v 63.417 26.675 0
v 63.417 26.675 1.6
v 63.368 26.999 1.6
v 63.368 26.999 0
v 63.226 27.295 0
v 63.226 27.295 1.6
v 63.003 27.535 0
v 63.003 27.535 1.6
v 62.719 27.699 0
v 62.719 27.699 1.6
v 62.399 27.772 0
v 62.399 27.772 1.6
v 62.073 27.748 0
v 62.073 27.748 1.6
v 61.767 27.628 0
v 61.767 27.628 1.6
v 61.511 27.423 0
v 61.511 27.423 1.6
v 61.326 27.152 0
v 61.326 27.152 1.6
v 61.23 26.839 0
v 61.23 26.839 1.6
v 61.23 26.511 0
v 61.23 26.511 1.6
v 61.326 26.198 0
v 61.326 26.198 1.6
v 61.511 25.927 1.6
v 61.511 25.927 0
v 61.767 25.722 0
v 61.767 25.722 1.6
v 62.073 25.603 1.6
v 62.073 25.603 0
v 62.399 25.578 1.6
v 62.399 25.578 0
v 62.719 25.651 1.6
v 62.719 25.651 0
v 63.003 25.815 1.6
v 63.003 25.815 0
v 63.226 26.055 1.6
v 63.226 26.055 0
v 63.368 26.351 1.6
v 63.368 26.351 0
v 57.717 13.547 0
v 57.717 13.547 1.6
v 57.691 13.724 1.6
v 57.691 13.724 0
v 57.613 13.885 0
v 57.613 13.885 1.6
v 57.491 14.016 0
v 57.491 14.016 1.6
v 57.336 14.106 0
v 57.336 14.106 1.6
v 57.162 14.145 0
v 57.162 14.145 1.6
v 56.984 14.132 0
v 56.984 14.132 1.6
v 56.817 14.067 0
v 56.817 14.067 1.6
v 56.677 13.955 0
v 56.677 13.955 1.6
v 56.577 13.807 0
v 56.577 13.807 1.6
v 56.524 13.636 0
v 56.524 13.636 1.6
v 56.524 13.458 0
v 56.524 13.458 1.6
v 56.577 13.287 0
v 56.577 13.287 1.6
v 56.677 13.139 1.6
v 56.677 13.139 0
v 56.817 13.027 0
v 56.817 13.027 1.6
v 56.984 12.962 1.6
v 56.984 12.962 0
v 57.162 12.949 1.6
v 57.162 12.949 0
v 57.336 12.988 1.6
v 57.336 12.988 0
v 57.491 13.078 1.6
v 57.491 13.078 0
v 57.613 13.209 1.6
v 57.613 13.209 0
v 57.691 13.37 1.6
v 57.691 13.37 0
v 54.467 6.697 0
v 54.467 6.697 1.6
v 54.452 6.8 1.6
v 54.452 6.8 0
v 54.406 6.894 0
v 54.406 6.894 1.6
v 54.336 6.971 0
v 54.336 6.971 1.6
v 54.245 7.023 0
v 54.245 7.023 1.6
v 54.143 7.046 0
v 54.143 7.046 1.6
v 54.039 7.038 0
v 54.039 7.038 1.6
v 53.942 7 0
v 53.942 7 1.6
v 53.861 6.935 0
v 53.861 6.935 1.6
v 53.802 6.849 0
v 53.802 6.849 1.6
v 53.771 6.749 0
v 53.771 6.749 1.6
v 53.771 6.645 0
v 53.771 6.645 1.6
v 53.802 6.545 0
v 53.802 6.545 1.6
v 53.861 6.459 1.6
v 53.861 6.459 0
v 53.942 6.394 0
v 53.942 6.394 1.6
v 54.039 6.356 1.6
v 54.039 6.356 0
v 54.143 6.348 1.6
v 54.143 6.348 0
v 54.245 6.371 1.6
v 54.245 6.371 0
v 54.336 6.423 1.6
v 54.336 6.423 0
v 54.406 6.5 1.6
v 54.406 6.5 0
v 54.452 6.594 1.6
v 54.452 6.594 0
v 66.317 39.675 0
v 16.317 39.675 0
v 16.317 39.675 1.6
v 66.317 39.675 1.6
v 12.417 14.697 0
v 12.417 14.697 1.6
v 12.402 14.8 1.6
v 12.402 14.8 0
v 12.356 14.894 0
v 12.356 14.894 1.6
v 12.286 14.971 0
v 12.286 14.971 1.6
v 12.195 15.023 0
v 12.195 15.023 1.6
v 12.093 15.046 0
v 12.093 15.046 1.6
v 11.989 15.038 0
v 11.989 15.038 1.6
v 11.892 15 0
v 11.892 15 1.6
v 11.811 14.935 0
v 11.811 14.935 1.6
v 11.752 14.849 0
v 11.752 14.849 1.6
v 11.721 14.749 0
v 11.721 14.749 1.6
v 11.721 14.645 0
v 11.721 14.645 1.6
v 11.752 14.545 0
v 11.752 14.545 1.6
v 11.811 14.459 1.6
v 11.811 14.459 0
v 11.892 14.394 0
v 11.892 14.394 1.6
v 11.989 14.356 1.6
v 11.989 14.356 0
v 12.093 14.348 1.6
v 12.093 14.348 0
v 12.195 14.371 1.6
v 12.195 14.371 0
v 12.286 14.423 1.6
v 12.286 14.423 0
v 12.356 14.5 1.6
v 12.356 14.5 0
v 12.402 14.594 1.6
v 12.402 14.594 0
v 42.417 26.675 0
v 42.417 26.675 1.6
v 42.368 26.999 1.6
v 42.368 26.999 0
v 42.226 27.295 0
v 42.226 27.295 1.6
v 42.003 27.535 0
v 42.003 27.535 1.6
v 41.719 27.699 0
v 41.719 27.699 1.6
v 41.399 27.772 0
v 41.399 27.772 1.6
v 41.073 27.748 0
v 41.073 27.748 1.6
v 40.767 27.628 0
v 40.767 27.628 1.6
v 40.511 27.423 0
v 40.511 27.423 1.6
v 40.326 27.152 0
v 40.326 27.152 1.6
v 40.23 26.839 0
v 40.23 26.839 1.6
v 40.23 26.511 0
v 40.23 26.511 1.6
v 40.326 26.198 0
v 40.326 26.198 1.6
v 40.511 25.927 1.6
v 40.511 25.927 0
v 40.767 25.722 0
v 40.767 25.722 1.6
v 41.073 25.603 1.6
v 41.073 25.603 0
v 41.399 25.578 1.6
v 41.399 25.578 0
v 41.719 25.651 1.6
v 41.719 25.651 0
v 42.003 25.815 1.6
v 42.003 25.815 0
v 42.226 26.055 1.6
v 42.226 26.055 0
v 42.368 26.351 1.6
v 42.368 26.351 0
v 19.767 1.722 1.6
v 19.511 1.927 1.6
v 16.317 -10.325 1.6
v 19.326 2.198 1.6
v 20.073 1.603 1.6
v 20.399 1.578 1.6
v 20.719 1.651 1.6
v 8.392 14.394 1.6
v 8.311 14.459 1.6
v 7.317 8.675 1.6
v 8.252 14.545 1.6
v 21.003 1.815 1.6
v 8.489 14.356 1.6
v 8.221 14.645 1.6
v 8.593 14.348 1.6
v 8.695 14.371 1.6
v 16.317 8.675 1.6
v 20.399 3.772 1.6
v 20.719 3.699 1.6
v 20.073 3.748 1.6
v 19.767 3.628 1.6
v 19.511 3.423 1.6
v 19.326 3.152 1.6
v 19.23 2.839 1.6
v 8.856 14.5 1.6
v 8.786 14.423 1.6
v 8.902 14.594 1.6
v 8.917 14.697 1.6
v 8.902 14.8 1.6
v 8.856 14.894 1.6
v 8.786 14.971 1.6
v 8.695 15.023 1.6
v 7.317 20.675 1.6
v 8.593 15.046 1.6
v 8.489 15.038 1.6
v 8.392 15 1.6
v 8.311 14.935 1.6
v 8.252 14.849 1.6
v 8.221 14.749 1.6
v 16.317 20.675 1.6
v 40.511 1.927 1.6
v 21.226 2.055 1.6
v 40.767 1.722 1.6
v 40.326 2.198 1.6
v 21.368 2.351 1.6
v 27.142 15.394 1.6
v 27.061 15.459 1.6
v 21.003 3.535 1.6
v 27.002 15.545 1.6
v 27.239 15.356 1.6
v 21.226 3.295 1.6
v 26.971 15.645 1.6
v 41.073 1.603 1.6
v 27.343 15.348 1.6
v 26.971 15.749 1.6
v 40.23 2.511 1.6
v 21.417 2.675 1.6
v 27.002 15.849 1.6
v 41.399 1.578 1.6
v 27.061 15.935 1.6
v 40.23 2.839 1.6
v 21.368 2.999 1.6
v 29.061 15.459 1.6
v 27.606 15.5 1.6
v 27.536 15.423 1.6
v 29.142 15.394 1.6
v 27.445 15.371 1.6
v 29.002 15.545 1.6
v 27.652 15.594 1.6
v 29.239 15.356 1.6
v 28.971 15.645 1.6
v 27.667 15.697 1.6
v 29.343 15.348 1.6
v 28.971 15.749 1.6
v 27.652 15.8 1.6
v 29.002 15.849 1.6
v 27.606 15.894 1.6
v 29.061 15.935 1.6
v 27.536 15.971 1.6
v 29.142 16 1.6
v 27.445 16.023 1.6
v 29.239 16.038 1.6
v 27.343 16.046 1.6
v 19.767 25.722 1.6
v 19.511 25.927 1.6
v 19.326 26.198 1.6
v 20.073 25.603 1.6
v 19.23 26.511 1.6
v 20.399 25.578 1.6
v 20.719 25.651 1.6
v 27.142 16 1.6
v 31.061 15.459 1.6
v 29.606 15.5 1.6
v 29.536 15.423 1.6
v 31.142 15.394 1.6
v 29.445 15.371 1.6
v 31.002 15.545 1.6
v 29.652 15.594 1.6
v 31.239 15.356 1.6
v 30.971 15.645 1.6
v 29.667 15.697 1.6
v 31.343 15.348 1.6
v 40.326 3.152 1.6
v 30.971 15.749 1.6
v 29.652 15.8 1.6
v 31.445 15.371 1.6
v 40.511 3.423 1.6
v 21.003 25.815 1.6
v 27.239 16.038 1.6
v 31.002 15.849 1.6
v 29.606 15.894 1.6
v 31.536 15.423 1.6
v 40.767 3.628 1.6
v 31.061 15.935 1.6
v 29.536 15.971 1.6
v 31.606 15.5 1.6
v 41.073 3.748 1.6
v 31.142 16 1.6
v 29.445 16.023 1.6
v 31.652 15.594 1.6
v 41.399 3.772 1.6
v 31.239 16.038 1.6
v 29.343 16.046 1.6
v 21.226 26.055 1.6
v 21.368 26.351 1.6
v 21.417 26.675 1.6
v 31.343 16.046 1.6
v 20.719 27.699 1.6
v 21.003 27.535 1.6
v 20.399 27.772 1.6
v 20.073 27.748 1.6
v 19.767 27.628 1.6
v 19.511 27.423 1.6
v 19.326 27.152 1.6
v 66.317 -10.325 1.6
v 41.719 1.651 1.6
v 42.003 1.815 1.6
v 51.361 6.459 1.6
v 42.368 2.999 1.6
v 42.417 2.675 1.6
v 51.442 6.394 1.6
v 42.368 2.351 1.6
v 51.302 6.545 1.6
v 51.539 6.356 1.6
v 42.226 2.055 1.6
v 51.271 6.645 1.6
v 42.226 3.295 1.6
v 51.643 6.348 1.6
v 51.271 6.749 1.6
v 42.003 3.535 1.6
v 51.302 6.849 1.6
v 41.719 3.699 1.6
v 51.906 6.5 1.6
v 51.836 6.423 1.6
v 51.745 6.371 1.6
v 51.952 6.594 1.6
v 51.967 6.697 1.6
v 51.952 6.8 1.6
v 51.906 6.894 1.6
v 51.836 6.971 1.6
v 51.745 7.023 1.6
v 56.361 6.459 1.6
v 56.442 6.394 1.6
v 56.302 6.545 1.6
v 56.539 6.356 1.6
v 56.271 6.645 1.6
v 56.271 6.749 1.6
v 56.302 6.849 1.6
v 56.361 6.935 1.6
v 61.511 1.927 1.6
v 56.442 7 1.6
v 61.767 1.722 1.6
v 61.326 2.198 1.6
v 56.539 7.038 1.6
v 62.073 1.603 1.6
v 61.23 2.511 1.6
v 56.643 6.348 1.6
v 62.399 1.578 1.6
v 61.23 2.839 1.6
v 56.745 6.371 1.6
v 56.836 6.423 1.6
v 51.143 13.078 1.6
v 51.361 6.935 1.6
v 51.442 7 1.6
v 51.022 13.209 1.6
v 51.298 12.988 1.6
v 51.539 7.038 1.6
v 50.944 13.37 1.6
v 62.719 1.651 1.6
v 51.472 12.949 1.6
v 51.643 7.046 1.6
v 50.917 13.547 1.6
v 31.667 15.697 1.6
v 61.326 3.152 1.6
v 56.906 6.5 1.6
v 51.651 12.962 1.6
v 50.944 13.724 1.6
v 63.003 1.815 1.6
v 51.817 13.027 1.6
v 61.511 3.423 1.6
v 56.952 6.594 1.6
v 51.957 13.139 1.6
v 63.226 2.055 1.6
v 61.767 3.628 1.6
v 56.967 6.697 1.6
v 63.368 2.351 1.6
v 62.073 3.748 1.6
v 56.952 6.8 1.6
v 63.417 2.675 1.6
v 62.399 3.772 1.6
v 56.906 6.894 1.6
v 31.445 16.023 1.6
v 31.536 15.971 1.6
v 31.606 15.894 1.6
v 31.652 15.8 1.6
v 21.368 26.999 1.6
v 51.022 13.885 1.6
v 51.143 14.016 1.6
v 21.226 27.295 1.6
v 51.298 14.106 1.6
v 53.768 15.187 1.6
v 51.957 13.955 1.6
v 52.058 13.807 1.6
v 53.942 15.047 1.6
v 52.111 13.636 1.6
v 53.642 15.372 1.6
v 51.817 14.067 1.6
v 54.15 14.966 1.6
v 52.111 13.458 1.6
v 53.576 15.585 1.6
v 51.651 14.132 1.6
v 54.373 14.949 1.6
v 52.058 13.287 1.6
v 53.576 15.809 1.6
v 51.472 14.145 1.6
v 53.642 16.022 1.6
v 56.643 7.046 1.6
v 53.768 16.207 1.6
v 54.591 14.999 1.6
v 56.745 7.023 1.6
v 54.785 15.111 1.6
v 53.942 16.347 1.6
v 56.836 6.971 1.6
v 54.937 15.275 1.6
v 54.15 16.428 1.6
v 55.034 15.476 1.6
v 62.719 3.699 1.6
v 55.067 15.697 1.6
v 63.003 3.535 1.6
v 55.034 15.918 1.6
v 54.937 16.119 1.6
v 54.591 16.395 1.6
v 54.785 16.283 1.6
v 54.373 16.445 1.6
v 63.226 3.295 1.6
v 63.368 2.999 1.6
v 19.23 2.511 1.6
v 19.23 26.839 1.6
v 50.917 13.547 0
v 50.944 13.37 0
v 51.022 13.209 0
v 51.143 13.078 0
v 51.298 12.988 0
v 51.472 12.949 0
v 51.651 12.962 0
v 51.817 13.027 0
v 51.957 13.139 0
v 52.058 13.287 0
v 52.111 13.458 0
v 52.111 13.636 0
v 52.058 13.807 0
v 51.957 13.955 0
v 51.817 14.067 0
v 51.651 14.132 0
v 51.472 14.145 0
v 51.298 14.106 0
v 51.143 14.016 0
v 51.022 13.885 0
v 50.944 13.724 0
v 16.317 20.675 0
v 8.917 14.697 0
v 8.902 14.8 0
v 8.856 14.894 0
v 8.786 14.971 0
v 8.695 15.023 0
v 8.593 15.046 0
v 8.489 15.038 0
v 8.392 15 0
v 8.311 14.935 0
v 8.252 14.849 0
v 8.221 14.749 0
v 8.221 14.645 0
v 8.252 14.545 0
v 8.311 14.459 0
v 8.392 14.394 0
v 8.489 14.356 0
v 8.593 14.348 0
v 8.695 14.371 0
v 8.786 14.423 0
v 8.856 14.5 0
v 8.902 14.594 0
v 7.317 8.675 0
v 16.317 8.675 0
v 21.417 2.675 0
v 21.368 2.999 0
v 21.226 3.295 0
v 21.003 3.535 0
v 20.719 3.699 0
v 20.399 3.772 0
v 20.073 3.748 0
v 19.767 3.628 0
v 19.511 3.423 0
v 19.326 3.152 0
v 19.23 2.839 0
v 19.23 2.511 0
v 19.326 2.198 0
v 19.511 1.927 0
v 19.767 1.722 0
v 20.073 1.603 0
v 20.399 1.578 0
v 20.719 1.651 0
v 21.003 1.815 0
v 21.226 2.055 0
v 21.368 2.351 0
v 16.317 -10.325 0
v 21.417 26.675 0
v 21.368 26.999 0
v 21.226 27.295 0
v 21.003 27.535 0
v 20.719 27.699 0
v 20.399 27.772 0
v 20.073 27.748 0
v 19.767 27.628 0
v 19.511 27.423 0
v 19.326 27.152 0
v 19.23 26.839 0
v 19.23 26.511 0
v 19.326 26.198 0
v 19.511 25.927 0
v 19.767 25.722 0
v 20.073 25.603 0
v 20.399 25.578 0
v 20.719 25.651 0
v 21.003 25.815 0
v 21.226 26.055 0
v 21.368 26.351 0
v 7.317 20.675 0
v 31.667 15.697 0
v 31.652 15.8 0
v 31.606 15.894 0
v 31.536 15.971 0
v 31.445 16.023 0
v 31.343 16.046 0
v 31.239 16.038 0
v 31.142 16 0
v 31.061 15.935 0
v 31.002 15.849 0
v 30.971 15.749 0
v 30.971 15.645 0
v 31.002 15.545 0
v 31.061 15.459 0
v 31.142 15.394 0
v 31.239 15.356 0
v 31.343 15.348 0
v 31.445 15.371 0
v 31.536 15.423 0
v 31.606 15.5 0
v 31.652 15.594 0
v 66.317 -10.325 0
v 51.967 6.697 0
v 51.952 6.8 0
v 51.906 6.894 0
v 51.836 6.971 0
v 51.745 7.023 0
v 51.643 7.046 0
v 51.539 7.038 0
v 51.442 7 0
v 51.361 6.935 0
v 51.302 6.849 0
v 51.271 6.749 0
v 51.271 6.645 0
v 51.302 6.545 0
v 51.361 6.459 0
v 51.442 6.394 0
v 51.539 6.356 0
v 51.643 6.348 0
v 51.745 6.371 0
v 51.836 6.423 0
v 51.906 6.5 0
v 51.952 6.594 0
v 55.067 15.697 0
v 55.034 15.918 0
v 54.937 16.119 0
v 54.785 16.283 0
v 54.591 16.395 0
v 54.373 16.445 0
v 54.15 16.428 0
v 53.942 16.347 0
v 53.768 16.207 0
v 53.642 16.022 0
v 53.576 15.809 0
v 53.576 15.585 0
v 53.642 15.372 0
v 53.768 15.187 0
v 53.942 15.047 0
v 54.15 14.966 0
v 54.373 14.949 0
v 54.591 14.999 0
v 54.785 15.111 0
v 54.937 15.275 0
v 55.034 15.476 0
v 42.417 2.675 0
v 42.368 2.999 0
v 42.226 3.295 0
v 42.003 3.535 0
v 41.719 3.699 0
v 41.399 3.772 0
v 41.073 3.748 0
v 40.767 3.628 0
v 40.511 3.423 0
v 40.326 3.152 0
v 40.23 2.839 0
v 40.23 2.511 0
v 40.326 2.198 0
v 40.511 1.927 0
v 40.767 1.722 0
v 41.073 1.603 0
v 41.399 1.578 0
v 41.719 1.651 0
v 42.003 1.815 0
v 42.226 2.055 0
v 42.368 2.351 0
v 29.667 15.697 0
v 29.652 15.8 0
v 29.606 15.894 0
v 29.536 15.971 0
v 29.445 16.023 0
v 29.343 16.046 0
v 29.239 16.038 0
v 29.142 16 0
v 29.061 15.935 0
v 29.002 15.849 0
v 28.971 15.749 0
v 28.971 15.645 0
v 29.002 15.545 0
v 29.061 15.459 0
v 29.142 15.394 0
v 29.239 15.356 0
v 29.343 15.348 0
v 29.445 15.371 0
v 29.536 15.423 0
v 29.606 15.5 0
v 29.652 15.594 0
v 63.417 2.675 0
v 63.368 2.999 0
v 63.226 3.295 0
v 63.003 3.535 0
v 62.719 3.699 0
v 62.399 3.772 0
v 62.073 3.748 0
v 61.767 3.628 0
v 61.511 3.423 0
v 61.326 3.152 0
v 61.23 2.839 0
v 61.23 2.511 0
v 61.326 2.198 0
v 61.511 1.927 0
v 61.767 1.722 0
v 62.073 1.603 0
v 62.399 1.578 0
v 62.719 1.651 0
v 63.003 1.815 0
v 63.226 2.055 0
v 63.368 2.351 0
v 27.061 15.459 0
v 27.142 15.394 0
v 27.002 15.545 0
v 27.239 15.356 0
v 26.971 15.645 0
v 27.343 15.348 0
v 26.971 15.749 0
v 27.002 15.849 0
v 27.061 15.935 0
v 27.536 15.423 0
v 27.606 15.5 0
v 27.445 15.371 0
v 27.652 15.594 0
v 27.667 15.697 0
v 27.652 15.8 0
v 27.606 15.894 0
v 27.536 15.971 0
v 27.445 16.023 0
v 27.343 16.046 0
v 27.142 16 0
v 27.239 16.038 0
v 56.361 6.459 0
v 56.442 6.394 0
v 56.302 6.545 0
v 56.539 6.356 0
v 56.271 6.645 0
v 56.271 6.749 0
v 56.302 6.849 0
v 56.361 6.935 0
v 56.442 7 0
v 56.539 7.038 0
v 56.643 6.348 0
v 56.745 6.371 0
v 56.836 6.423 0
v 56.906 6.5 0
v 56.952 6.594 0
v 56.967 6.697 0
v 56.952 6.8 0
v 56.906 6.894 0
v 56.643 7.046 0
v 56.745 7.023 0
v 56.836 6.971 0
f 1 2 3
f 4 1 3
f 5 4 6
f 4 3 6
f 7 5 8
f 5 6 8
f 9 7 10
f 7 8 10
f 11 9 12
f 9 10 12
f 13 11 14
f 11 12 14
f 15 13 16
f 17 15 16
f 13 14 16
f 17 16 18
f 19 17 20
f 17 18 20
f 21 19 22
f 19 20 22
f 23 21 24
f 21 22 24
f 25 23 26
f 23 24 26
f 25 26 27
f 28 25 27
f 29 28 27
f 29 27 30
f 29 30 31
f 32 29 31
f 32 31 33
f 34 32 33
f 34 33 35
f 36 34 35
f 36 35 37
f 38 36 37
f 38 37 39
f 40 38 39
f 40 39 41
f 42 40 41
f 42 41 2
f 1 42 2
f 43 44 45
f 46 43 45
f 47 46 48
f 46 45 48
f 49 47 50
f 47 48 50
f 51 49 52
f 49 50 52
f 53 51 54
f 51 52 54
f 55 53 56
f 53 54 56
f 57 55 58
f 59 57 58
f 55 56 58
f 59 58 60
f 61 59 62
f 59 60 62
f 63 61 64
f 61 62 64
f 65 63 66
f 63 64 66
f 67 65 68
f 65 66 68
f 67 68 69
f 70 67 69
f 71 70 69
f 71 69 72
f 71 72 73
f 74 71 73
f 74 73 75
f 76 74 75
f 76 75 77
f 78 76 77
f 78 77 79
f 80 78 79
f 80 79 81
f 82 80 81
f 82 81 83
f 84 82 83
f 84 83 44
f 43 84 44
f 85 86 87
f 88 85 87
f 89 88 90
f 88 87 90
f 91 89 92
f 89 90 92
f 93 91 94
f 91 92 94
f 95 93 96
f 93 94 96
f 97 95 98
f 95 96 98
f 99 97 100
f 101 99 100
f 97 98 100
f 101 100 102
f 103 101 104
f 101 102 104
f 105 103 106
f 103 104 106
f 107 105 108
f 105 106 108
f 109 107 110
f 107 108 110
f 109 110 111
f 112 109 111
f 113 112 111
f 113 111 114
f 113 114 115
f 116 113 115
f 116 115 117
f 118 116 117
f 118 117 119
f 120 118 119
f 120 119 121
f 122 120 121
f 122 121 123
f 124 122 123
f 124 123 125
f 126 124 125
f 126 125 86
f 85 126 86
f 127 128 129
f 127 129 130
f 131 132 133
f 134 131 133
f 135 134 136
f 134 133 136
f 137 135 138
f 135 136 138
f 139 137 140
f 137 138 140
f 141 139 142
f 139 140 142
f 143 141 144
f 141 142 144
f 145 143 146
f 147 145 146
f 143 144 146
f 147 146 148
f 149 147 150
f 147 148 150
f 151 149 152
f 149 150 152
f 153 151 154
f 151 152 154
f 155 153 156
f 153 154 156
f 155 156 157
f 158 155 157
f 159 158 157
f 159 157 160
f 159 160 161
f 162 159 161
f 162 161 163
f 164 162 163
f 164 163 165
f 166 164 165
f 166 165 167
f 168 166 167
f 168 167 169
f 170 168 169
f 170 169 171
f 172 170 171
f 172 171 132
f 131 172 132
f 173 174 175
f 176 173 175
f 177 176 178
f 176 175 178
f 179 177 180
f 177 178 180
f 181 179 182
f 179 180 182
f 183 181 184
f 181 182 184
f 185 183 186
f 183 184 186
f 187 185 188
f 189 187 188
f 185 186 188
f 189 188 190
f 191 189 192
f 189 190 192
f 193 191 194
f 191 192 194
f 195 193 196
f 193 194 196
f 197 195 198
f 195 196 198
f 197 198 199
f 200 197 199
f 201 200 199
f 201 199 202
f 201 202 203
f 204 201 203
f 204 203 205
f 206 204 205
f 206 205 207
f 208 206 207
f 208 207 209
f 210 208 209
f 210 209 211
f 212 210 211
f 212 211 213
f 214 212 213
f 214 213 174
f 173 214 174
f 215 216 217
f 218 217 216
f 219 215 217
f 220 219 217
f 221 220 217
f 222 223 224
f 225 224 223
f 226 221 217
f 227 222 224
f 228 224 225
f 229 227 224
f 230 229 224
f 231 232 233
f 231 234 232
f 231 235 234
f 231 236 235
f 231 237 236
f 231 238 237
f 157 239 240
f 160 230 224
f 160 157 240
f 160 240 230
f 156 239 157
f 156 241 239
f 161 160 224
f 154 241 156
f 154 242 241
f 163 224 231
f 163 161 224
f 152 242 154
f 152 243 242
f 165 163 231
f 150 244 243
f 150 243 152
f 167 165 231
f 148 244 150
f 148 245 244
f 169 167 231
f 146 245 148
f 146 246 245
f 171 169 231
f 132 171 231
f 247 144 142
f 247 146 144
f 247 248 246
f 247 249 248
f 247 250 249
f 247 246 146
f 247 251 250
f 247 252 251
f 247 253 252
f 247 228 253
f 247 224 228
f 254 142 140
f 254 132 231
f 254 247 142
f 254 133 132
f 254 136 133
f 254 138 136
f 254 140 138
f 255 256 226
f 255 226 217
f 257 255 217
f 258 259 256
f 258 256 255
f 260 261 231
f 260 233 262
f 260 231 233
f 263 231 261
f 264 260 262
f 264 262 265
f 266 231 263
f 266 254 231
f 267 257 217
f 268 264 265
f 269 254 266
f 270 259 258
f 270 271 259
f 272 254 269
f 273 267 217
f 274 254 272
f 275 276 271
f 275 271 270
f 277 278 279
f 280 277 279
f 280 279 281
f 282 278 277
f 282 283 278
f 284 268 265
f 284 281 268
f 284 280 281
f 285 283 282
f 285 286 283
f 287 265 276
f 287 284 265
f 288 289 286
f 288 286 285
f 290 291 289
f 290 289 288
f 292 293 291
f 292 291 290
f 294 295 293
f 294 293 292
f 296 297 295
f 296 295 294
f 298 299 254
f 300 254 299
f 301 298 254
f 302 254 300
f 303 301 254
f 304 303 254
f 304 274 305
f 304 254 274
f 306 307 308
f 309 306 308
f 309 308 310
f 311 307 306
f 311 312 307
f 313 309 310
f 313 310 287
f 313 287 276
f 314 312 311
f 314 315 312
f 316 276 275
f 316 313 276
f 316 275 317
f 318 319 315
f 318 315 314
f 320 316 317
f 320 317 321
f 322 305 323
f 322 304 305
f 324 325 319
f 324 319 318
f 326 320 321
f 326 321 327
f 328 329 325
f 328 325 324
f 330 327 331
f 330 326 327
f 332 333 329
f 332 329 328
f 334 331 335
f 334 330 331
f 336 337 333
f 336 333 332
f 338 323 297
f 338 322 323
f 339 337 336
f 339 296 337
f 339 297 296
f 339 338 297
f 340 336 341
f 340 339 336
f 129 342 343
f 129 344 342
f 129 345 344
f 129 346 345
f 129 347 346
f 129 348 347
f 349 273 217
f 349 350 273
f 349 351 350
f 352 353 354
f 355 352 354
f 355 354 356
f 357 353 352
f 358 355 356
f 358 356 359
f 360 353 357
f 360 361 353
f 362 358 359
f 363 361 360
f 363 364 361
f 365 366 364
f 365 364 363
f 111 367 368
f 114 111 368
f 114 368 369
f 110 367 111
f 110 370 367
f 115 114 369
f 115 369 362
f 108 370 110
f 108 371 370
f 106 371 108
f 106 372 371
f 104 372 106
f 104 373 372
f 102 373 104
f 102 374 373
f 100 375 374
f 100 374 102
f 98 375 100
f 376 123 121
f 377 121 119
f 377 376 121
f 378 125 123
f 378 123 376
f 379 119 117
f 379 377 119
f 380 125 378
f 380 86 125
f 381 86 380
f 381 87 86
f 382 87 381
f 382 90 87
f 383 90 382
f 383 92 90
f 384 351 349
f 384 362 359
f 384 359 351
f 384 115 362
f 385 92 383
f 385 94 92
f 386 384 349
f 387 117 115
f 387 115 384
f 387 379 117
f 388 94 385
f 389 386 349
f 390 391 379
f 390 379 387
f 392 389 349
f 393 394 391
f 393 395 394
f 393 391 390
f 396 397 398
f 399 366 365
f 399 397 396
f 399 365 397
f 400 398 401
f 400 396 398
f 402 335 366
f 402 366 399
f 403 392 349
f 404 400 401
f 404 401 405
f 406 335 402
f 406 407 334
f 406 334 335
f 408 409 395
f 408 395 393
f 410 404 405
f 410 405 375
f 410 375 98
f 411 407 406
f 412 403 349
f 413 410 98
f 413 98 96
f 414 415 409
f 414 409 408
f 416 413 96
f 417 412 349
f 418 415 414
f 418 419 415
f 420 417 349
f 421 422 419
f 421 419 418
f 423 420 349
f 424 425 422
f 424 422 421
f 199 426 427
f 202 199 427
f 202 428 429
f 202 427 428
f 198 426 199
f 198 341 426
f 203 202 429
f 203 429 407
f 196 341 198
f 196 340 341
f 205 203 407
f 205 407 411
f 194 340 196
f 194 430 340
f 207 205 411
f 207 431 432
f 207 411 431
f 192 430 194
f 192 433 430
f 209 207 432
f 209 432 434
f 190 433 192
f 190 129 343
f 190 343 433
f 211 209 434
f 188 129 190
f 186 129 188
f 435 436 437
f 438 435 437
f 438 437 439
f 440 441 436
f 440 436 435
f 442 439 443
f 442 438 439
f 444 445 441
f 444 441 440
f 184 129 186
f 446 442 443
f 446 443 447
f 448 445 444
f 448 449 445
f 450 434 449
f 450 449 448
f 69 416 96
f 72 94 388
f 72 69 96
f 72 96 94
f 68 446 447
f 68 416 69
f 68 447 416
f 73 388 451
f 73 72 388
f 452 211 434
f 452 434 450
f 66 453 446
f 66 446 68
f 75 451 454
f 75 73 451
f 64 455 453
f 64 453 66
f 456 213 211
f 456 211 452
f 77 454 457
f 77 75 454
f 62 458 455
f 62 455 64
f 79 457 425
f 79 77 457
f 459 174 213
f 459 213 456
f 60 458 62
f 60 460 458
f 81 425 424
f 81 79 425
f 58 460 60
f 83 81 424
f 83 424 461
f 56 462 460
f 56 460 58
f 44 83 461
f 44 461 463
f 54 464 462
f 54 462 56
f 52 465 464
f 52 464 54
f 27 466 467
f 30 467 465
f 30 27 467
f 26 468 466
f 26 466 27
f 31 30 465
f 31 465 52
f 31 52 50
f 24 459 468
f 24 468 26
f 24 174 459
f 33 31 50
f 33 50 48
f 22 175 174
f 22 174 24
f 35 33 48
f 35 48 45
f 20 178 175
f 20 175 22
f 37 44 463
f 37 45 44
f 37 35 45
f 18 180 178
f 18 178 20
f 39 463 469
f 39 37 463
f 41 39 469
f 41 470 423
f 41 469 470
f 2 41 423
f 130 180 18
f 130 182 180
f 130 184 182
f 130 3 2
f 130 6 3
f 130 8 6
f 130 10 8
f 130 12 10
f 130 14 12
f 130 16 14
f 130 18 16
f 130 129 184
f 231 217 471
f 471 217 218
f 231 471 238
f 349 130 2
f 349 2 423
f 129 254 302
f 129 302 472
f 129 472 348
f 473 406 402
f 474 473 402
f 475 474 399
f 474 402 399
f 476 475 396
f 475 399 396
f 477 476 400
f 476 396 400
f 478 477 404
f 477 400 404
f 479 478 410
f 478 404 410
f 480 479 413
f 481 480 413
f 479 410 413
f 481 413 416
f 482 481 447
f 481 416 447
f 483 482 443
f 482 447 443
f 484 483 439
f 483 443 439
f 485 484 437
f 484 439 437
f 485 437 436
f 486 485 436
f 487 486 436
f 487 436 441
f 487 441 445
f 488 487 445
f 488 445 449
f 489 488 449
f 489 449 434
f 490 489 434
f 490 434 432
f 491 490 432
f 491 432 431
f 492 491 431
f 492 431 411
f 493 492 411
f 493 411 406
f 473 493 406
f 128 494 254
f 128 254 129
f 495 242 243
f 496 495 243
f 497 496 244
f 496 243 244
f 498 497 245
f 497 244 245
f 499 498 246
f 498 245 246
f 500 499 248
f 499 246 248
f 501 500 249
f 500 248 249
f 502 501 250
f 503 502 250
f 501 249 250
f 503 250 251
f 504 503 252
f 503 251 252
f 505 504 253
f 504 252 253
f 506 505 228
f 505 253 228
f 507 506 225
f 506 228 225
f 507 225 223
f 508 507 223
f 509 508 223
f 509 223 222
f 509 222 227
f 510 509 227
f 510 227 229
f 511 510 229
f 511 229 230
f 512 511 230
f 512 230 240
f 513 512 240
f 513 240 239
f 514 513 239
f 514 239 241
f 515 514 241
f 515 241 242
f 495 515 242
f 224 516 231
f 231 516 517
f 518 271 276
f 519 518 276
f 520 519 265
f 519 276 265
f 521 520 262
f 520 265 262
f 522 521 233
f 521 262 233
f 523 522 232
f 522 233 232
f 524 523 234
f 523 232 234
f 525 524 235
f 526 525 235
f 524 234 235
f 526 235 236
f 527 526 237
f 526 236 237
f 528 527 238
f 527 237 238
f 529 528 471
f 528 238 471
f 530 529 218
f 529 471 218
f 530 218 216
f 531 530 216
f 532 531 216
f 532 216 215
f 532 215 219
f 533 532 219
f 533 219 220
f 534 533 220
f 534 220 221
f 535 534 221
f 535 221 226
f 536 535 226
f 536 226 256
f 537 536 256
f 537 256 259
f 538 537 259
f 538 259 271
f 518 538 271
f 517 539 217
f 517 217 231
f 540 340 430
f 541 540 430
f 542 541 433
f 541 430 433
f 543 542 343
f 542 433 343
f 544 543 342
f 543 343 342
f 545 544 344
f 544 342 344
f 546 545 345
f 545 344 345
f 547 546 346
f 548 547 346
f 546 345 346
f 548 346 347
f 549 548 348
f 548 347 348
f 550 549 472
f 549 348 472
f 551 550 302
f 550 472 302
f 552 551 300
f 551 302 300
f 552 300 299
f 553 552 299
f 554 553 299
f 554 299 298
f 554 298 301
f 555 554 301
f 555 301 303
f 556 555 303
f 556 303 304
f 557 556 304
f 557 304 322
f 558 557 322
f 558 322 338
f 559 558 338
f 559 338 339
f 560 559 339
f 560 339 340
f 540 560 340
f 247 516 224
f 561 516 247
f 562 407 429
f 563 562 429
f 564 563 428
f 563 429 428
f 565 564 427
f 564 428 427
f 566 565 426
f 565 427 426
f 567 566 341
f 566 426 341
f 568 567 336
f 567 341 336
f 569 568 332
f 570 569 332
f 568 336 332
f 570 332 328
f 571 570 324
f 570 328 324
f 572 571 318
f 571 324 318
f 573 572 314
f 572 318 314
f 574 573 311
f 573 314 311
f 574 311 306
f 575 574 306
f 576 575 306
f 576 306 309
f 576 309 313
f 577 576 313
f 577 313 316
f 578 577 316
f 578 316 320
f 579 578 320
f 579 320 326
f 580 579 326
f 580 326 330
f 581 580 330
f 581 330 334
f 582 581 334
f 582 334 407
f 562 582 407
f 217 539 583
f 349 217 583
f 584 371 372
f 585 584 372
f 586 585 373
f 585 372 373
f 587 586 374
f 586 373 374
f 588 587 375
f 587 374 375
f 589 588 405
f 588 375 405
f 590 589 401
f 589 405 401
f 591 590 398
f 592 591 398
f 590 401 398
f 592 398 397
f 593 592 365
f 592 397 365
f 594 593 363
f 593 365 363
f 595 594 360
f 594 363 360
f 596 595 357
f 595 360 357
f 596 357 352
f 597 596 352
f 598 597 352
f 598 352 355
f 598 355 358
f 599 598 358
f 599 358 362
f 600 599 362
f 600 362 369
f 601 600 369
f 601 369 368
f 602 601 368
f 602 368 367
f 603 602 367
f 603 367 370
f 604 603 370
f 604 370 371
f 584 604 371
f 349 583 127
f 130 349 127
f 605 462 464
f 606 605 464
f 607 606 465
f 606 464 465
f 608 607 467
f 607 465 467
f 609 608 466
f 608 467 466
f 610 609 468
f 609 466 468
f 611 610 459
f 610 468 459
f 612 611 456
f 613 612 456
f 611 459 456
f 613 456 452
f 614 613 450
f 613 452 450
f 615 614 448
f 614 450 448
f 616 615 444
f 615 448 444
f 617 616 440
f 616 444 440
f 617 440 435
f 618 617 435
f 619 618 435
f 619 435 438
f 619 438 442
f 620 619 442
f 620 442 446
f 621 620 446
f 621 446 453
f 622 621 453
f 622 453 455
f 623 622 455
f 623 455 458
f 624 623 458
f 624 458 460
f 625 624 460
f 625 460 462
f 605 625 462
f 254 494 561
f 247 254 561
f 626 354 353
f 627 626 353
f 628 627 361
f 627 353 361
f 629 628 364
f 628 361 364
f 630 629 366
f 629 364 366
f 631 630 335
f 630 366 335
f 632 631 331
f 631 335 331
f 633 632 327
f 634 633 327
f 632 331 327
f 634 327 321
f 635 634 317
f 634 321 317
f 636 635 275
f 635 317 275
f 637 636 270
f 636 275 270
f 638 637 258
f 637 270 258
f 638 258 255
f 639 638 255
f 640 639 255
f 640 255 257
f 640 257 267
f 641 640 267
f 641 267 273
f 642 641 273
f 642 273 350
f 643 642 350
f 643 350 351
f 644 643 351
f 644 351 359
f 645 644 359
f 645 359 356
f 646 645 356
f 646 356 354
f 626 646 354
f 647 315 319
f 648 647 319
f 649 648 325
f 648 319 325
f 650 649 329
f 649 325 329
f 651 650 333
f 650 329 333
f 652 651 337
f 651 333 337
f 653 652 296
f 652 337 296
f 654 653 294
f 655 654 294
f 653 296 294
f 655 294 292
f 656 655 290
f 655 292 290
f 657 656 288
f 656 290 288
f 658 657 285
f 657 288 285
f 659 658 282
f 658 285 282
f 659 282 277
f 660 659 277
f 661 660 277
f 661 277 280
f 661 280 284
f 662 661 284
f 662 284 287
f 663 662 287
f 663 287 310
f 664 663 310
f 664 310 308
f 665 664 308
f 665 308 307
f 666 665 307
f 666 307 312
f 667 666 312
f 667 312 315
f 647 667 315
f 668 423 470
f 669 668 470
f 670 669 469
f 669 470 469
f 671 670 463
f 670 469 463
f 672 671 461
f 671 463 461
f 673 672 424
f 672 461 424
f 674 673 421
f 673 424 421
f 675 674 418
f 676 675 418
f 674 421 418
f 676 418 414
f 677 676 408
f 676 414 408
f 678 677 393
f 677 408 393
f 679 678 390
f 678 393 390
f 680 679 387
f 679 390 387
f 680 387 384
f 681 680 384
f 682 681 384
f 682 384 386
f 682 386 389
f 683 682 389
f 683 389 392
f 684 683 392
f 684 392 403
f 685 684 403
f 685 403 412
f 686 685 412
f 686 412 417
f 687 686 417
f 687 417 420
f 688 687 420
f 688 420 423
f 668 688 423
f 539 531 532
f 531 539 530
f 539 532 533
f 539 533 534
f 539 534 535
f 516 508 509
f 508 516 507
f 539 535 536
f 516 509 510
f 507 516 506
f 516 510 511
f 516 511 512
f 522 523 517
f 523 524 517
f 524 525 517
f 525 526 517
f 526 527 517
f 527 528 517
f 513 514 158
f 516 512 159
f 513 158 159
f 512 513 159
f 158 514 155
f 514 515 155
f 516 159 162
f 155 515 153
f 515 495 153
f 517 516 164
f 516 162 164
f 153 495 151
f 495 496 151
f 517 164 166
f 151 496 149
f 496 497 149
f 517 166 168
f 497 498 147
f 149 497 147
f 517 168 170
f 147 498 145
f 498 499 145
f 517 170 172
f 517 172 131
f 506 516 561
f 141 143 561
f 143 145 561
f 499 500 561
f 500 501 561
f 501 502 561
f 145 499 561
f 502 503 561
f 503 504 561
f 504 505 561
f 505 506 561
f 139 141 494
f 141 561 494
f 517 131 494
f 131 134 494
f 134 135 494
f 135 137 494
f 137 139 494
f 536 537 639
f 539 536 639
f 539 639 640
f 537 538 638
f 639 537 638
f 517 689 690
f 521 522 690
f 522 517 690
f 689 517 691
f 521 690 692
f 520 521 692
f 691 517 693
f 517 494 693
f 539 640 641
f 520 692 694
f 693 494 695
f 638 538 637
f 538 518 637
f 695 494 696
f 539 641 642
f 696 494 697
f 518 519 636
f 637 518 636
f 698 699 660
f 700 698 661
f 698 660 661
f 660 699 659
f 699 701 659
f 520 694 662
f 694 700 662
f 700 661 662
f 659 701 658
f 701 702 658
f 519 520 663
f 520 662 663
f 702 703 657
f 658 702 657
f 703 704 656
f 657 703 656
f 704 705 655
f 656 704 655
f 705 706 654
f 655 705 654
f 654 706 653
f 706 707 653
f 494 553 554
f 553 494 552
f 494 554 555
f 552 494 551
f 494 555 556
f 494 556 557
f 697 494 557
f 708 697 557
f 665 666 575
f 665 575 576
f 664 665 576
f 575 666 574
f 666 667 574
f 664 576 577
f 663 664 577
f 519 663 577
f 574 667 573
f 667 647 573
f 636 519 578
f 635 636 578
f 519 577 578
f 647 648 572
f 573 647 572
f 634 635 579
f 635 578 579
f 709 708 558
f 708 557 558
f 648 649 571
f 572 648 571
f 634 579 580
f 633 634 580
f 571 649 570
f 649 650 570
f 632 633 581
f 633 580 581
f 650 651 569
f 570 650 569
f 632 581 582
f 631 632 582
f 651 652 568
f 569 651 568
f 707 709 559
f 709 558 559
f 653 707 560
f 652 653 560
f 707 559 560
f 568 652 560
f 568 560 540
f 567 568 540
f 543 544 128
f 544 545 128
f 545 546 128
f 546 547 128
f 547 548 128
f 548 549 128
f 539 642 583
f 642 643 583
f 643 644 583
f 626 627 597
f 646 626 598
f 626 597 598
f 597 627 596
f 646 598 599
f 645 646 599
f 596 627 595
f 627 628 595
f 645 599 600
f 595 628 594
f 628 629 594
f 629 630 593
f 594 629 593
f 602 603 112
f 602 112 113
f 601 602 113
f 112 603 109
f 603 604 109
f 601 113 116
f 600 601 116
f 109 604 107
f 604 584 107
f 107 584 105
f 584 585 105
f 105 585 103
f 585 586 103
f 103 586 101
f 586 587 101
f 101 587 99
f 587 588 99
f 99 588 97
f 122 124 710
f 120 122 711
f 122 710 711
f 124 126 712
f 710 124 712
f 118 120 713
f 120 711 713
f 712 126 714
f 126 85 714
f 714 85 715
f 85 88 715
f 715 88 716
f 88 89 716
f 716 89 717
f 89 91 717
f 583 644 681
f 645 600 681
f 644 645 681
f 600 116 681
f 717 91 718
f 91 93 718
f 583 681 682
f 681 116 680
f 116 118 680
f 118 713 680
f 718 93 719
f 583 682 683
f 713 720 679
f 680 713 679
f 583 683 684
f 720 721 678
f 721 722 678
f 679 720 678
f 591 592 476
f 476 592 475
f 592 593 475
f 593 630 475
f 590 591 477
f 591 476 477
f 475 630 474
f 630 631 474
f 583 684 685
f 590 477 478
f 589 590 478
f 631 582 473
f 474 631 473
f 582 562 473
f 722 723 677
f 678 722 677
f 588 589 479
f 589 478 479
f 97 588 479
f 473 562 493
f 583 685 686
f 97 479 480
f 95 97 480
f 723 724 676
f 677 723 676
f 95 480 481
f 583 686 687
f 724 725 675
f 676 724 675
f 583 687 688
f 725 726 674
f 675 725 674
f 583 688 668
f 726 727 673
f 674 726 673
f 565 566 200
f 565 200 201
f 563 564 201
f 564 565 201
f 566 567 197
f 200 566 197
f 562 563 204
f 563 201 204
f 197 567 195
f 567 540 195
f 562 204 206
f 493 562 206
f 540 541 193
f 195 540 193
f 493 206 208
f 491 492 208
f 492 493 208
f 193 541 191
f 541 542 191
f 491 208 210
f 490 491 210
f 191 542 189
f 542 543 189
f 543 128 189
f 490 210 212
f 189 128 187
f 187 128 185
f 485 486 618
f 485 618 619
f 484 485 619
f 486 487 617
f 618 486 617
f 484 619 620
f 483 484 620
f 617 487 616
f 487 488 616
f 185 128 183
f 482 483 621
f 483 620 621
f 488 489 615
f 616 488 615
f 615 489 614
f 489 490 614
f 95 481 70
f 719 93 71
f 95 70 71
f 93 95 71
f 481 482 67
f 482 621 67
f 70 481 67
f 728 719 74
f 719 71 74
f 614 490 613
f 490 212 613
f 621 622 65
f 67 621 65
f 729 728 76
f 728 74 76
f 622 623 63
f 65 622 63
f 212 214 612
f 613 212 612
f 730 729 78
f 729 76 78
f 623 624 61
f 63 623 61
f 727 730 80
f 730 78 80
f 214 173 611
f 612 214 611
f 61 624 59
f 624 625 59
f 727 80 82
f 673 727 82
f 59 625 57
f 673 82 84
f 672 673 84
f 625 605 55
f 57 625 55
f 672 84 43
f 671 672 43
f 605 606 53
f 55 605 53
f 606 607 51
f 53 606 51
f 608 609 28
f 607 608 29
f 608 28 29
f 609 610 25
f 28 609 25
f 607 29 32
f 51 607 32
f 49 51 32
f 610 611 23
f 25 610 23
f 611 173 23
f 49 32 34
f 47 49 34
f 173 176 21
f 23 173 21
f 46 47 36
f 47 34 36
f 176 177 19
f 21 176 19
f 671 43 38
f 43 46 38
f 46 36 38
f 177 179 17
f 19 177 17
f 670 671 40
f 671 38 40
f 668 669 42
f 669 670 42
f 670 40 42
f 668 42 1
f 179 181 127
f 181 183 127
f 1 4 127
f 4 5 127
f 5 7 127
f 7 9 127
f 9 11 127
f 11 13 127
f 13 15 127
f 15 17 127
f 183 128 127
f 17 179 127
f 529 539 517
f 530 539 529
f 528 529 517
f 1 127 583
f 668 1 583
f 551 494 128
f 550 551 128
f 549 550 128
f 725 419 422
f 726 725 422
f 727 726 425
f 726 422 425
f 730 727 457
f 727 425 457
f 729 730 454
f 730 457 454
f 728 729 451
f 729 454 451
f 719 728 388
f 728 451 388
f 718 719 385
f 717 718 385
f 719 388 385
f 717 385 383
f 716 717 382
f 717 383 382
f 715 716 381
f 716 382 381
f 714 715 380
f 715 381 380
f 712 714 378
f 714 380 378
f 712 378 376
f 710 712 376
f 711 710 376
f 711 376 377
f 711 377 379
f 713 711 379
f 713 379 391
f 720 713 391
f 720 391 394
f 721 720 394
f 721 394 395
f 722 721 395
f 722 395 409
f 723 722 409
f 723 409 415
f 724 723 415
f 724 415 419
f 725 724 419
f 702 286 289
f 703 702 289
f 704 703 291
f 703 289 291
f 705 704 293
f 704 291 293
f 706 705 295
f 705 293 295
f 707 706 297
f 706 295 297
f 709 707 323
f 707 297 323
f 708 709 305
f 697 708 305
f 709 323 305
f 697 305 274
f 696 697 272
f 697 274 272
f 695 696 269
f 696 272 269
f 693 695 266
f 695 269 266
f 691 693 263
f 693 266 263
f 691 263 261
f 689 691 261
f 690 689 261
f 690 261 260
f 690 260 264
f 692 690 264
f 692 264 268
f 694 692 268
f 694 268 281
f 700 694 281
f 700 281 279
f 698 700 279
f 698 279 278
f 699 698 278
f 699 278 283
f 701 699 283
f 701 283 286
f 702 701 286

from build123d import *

# Parameters (mm, degrees)
F0_W     = 9
F0_H     = 12
F0_W_2   = 50
F0_H_2   = 19
F1_DEPTH = 1.6
F4_R     = 0.35
F5_R     = 0.35
F2_R     = 0.35
F6_DEPTH = 4
F7_R     = 1.1
F8_DEPTH = 25


# Not quite as in the source:
# - a feature names something its author has since deleted; it is built from what else it names


with BuildPart() as f1:
    # F0 (on Top) → F1 (new body)
    with BuildSketch(Plane.XY):
        with Locations((11.8172904253, 14.6750973295)):
            Rectangle(F0_W, F0_H)
        with Locations((41.3172904253, 14.6750973295)):
            Rectangle(F0_W_2, F0_H)
        with Locations((41.3172904253, -0.8249026705)):
            Rectangle(F0_W_2, F0_H_2)
        with Locations((41.3172904253, 30.1750973295)):
            Rectangle(F0_W_2, F0_H_2)
    extrude(amount=F1_DEPTH)

    # F4 (on face) + F5 (on face) + F3 (on face) + F2 (on face) → F6 (cut)
    with BuildSketch(Plane.XY.offset(1.6)):
        with Locations((51.6172904253, 6.6970097786)):
            Circle(F4_R)
        with Locations((56.6172904253, 6.6970097786)):
            Circle(F4_R)
        with Locations((54.1172904253, 6.6970097786)):
            Circle(F4_R)
    with BuildSketch(Plane.XY.offset(1.6)):
        with Locations((8.5672904253, 14.6970097786)):
            Circle(F5_R)
        with Locations((12.0672904253, 14.6970097786)):
            Circle(F5_R)
    with BuildSketch(Plane.XY.offset(1.6)):
        with BuildLine():
            Line((54.8172904253, 15.4470097786), (53.8172904253, 15.4470097786))
            ThreePointArc((53.8172904253, 15.4470097786), (53.640513733, 15.5202330803), (53.5672904253, 15.6970097701))
            ThreePointArc((53.5672904253, 15.6970097701), (54.3172904296, 14.9470097786), (55.0672904253, 15.6970097786))
            ThreePointArc((55.0672904253, 15.6970097786), (54.9940671206, 15.5202330833), (54.8172904253, 15.4470097786))
        make_face()
        with BuildLine():
            ThreePointArc((53.5672904253, 15.6970097701), (53.640513733, 15.5202330803), (53.8172904253, 15.4470097786))
            Line((53.8172904253, 15.4470097786), (54.8172904253, 15.4470097786))
            ThreePointArc((54.8172904253, 15.4470097786), (54.9940671206, 15.5202330833), (55.0672904253, 15.6970097786))
            ThreePointArc((55.0672904253, 15.6970097786), (54.9940671206, 15.8737864739), (54.8172904253, 15.9470097786))
            Line((54.8172904253, 15.9470097786), (53.8172904253, 15.9470097786))
            ThreePointArc((53.8172904253, 15.9470097786), (53.640513727, 15.8737864709), (53.5672904253, 15.6970097701))
        make_face()
        with BuildLine():
            ThreePointArc((55.0672904253, 15.6970097786), (54.317290421, 16.4470097786), (53.5672904253, 15.6970097701))
            ThreePointArc((53.5672904253, 15.6970097701), (53.640513727, 15.8737864709), (53.8172904253, 15.9470097786))
            Line((53.8172904253, 15.9470097786), (54.8172904253, 15.9470097786))
            ThreePointArc((54.8172904253, 15.9470097786), (54.9940671206, 15.8737864739), (55.0672904253, 15.6970097786))
        make_face()
        with BuildLine():
            Line((51.1672904253, 13.7970097786), (51.8672904253, 13.7970097786))
            ThreePointArc((51.8672904253, 13.7970097786), (52.0440671206, 13.7237864739), (52.1172904253, 13.5470097786))
            ThreePointArc((52.1172904253, 13.5470097786), (51.5172904253, 14.1470097786), (50.9172904253, 13.5470097786))
            ThreePointArc((50.9172904253, 13.5470097786), (50.99051373, 13.7237864739), (51.1672904253, 13.7970097786))
        make_face()
        with BuildLine():
            ThreePointArc((52.1172904253, 13.5470097786), (52.0440671206, 13.7237864739), (51.8672904253, 13.7970097786))
            Line((51.8672904253, 13.7970097786), (51.1672904253, 13.7970097786))
            ThreePointArc((51.1672904253, 13.7970097786), (50.99051373, 13.7237864739), (50.9172904253, 13.5470097786))
            ThreePointArc((50.9172904253, 13.5470097786), (50.99051373, 13.3702330833), (51.1672904253, 13.2970097786))
            Line((51.1672904253, 13.2970097786), (51.8672904253, 13.2970097786))
            ThreePointArc((51.8672904253, 13.2970097786), (52.0440671206, 13.3702330833), (52.1172904253, 13.5470097786))
        make_face()
        with BuildLine():
            ThreePointArc((50.9172904253, 13.5470097786), (51.5172904253, 12.9470097786), (52.1172904253, 13.5470097786))
            ThreePointArc((52.1172904253, 13.5470097786), (52.0440671206, 13.3702330833), (51.8672904253, 13.2970097786))
            Line((51.8672904253, 13.2970097786), (51.1672904253, 13.2970097786))
            ThreePointArc((51.1672904253, 13.2970097786), (50.99051373, 13.3702330833), (50.9172904253, 13.5470097786))
        make_face()
        with BuildLine():
            Line((56.7672904253, 13.2970097786), (57.4672904253, 13.2970097786))
            ThreePointArc((57.4672904253, 13.2970097786), (57.6440671206, 13.3702330833), (57.7172904253, 13.5470097786))
            ThreePointArc((57.7172904253, 13.5470097786), (57.6440671206, 13.7237864739), (57.4672904253, 13.7970097786))
            Line((57.4672904253, 13.7970097786), (56.7672904253, 13.7970097786))
            ThreePointArc((56.7672904253, 13.7970097786), (56.59051373, 13.7237864739), (56.5172904253, 13.5470097786))
            ThreePointArc((56.5172904253, 13.5470097786), (56.59051373, 13.3702330833), (56.7672904253, 13.2970097786))
        make_face()
        with BuildLine():
            ThreePointArc((57.7172904253, 13.5470097786), (57.6440671206, 13.3702330833), (57.4672904253, 13.2970097786))
            Line((57.4672904253, 13.2970097786), (56.7672904253, 13.2970097786))
            ThreePointArc((56.7672904253, 13.2970097786), (56.59051373, 13.3702330833), (56.5172904253, 13.5470097786))
            ThreePointArc((56.5172904253, 13.5470097786), (57.1172904253, 12.9470097786), (57.7172904253, 13.5470097786))
        make_face()
        with BuildLine():
            ThreePointArc((57.4672904253, 13.7970097786), (57.6440671206, 13.7237864739), (57.7172904253, 13.5470097786))
            ThreePointArc((57.7172904253, 13.5470097786), (57.1172904253, 14.1470097786), (56.5172904253, 13.5470097786))
            ThreePointArc((56.5172904253, 13.5470097786), (56.59051373, 13.7237864739), (56.7672904253, 13.7970097786))
            Line((56.7672904253, 13.7970097786), (57.4672904253, 13.7970097786))
        make_face()
    with BuildSketch(Plane.XY.offset(1.6)):
        with Locations((27.3172904253, 15.6970097786)):
            Circle(F2_R)
        with Locations((29.3172904253, 15.6970097786)):
            Circle(F2_R)
        with Locations((31.3172904253, 15.6970097786)):
            Circle(F2_R)
    extrude(amount=-F6_DEPTH, mode=Mode.SUBTRACT)

    # F7 (on face) → F8 (cut)
    with BuildSketch(Plane.XY.offset(1.6)):
        with Locations((62.3172904253, 26.6750973295)):
            Circle(F7_R)
        with Locations((20.3172904253, 26.6750973295)):
            Circle(F7_R)
        with Locations((62.3172904253, 2.6750973295)):
            Circle(F7_R)
        with Locations((20.3172904253, 2.6750973295)):
            Circle(F7_R)
        with Locations((41.3172904253, 2.6750973295)):
            Circle(F7_R)
        with Locations((41.3172904253, 26.6750973295)):
            Circle(F7_R)
    extrude(amount=-F8_DEPTH, mode=Mode.SUBTRACT)


solid = f1.part
